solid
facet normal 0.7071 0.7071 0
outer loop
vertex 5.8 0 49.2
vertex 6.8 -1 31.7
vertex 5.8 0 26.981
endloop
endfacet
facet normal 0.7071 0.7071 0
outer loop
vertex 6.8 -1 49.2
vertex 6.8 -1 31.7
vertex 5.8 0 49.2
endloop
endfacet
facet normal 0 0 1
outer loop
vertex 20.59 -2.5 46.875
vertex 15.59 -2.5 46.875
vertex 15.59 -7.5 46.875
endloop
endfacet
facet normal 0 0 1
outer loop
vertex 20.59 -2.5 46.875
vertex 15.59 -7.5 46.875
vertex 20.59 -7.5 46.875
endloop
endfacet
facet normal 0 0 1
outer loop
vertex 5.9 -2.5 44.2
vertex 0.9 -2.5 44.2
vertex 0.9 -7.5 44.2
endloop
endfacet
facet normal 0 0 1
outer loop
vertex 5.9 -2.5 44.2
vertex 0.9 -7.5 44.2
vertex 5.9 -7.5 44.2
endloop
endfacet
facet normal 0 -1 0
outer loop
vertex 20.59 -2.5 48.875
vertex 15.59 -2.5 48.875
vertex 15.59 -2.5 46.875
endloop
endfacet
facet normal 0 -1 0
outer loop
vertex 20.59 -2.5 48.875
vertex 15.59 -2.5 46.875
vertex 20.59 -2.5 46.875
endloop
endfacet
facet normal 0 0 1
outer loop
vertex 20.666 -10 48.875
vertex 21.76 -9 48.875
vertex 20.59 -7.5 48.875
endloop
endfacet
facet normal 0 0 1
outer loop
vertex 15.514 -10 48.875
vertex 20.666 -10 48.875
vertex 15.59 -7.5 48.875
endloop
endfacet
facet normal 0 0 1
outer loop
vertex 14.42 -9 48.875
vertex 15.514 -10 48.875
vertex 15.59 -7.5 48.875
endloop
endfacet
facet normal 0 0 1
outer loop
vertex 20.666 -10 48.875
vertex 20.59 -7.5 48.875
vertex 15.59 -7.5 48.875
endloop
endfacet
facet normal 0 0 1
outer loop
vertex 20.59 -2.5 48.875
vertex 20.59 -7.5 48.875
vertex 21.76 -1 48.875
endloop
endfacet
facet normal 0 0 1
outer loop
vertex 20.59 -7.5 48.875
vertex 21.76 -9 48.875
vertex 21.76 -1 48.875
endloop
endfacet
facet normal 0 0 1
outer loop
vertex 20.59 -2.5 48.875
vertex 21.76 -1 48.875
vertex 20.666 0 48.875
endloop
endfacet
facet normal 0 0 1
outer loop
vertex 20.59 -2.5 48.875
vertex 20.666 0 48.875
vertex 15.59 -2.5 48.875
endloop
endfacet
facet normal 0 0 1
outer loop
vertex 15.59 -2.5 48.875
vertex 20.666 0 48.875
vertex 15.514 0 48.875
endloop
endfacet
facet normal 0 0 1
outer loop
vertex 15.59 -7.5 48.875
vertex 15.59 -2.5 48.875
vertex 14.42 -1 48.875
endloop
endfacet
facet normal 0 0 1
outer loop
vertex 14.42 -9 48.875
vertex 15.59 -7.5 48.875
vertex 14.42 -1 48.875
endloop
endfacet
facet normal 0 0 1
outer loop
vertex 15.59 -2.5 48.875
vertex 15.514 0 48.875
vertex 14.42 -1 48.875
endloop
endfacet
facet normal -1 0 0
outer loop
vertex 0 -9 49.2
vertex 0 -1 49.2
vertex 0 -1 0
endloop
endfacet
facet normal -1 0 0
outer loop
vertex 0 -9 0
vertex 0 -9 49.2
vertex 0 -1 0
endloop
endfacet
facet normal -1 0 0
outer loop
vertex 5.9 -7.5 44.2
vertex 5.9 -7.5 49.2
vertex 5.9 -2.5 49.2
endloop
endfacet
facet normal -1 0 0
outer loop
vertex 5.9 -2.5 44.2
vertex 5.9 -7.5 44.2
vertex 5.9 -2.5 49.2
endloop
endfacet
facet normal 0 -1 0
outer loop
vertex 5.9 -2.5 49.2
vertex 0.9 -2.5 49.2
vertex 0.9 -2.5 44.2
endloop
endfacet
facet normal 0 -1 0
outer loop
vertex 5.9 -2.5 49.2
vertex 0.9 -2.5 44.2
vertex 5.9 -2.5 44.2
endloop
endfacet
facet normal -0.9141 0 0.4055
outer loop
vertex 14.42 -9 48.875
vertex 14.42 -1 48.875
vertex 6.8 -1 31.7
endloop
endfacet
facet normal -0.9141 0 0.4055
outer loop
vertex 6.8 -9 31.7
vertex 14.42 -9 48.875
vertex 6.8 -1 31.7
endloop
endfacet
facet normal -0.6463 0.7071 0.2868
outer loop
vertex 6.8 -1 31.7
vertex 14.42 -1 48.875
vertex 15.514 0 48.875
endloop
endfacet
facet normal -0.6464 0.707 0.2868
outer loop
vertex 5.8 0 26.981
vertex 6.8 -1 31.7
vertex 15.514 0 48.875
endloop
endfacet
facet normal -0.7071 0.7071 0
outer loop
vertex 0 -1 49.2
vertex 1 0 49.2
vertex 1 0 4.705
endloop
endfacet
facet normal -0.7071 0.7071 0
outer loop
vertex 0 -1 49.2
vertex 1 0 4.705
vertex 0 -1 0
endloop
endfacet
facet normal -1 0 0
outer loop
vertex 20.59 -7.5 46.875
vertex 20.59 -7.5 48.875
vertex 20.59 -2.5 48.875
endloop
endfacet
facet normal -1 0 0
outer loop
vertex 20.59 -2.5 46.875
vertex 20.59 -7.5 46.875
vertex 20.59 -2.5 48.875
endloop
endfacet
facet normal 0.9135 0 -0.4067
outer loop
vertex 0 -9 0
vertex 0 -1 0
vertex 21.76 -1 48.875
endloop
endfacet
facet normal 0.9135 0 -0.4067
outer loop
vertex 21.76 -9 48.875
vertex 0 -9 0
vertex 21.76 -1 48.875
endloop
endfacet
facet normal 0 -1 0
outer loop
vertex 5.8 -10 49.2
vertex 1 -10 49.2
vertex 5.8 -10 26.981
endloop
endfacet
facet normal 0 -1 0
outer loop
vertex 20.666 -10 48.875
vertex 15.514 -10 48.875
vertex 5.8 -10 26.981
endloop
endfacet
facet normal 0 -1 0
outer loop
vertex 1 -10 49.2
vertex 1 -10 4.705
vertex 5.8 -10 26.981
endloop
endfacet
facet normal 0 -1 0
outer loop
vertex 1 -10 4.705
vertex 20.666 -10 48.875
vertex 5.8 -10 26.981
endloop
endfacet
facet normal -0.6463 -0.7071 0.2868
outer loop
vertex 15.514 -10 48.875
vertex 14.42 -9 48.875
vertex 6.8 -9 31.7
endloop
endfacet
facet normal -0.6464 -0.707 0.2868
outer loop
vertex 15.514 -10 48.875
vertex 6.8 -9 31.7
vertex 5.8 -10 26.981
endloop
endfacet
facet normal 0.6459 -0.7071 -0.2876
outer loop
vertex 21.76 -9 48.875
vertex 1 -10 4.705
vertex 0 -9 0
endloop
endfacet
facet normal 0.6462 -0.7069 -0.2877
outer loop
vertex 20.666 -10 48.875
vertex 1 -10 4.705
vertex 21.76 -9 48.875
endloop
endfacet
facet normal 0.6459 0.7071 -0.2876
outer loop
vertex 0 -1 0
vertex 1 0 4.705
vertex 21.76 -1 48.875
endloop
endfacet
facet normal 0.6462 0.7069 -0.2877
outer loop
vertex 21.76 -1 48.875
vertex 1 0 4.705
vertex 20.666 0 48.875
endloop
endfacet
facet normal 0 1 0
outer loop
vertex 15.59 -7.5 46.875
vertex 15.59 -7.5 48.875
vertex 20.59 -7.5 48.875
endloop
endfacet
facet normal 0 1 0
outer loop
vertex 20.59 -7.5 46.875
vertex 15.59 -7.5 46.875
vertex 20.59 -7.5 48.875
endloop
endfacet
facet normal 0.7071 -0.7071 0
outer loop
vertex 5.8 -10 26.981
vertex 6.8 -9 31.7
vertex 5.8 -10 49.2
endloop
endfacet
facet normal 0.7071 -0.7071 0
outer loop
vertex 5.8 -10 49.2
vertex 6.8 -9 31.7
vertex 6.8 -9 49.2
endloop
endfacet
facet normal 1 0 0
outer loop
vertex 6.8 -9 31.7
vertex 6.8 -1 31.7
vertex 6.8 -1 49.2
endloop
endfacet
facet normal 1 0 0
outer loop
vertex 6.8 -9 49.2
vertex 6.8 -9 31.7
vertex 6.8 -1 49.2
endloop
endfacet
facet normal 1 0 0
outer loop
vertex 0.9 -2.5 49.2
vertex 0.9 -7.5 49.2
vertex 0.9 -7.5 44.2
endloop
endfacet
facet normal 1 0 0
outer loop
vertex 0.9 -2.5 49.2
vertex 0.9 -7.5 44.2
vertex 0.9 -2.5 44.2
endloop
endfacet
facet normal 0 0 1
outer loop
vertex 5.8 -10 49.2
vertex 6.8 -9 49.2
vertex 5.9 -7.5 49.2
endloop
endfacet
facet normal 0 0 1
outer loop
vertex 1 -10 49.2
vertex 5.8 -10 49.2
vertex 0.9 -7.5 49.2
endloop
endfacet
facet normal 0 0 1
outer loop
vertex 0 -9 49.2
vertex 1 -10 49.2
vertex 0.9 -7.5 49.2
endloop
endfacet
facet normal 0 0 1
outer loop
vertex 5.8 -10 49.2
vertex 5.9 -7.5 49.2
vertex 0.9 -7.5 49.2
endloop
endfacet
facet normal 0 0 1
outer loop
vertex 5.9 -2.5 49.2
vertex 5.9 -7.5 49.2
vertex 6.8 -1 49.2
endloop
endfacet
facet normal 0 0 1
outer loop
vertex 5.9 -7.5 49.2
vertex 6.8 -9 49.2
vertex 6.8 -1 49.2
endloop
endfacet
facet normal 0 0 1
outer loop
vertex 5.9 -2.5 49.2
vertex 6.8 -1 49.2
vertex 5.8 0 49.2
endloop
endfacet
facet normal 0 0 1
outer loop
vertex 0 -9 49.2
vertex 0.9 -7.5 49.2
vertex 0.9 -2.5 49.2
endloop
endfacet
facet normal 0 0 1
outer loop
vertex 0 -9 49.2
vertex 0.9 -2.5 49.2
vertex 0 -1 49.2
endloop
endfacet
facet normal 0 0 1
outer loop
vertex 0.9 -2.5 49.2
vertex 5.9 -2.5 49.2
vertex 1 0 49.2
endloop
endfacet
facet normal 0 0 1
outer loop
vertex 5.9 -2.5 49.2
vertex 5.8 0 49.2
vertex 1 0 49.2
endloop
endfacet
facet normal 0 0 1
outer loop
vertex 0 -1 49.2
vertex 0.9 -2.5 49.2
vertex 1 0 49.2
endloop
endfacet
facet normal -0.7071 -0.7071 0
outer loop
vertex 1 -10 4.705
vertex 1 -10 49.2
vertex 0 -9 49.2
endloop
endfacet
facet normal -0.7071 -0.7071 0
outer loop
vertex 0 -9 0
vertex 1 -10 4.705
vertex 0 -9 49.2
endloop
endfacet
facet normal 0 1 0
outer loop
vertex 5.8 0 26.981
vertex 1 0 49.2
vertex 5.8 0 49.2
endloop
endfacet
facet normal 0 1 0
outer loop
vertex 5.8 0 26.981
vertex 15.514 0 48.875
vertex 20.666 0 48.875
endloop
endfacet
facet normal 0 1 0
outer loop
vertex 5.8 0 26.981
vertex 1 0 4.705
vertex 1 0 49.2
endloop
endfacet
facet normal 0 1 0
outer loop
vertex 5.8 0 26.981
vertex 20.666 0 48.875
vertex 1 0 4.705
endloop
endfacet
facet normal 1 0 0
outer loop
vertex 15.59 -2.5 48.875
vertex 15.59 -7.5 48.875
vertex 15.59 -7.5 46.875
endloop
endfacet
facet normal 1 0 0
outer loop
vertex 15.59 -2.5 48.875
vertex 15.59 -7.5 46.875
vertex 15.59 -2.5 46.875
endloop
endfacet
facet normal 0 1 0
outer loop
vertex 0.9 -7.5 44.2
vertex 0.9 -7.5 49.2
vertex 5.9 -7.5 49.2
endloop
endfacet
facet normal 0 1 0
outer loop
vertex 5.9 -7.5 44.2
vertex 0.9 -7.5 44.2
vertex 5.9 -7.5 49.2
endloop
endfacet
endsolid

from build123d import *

# Parameters (mm, degrees)
F1_DEPTH = 10
F2_W     = 5
F2_H     = 5
F3_DEPTH = 5
F4_W     = 5
F4_H     = 5
F5_DEPTH = 2
F6_SIZE  = 1


with BuildPart() as f1:
    # F0 (on Front) → F1 (new body)
    with BuildSketch(Plane.XZ):
        Polygon((0, 49.2), (0, 0), (21.76041, 48.874682), (14.42041, 48.874682), (6.8, 31.7), (6.8, 49.2), align=None)
    extrude(amount=F1_DEPTH)

    # F2 (on face) → F3 (cut)
    with BuildSketch(Plane.XY.offset(49.2)):
        with Locations((3.4, -5)):
            Rectangle(F2_W, F2_H)
    extrude(amount=-F3_DEPTH, mode=Mode.SUBTRACT)

    # F4 (on face) → F5 (cut)
    with BuildSketch(Plane.XY.offset(48.874682)):
        with Locations((18.09041, -5)):
            Rectangle(F4_W, F4_H)
    extrude(amount=-F5_DEPTH, mode=Mode.SUBTRACT)

    # F6
    f6_edges = [f1.edges().sort_by_distance(p)[0] for p in [
        (6.8, -10, 40.45),
        (0, -10, 24.6),
        (10.610205, -10, 40.287341),
        (6.8, 0, 40.45),
        (10.880205, 0, 24.437341),
        (10.610205, 0, 40.287341),
        (10.880205, -10, 24.437341),
        (0, 0, 24.6),
    ]]
    chamfer(f6_edges, length=F6_SIZE)


solid = f1.part
